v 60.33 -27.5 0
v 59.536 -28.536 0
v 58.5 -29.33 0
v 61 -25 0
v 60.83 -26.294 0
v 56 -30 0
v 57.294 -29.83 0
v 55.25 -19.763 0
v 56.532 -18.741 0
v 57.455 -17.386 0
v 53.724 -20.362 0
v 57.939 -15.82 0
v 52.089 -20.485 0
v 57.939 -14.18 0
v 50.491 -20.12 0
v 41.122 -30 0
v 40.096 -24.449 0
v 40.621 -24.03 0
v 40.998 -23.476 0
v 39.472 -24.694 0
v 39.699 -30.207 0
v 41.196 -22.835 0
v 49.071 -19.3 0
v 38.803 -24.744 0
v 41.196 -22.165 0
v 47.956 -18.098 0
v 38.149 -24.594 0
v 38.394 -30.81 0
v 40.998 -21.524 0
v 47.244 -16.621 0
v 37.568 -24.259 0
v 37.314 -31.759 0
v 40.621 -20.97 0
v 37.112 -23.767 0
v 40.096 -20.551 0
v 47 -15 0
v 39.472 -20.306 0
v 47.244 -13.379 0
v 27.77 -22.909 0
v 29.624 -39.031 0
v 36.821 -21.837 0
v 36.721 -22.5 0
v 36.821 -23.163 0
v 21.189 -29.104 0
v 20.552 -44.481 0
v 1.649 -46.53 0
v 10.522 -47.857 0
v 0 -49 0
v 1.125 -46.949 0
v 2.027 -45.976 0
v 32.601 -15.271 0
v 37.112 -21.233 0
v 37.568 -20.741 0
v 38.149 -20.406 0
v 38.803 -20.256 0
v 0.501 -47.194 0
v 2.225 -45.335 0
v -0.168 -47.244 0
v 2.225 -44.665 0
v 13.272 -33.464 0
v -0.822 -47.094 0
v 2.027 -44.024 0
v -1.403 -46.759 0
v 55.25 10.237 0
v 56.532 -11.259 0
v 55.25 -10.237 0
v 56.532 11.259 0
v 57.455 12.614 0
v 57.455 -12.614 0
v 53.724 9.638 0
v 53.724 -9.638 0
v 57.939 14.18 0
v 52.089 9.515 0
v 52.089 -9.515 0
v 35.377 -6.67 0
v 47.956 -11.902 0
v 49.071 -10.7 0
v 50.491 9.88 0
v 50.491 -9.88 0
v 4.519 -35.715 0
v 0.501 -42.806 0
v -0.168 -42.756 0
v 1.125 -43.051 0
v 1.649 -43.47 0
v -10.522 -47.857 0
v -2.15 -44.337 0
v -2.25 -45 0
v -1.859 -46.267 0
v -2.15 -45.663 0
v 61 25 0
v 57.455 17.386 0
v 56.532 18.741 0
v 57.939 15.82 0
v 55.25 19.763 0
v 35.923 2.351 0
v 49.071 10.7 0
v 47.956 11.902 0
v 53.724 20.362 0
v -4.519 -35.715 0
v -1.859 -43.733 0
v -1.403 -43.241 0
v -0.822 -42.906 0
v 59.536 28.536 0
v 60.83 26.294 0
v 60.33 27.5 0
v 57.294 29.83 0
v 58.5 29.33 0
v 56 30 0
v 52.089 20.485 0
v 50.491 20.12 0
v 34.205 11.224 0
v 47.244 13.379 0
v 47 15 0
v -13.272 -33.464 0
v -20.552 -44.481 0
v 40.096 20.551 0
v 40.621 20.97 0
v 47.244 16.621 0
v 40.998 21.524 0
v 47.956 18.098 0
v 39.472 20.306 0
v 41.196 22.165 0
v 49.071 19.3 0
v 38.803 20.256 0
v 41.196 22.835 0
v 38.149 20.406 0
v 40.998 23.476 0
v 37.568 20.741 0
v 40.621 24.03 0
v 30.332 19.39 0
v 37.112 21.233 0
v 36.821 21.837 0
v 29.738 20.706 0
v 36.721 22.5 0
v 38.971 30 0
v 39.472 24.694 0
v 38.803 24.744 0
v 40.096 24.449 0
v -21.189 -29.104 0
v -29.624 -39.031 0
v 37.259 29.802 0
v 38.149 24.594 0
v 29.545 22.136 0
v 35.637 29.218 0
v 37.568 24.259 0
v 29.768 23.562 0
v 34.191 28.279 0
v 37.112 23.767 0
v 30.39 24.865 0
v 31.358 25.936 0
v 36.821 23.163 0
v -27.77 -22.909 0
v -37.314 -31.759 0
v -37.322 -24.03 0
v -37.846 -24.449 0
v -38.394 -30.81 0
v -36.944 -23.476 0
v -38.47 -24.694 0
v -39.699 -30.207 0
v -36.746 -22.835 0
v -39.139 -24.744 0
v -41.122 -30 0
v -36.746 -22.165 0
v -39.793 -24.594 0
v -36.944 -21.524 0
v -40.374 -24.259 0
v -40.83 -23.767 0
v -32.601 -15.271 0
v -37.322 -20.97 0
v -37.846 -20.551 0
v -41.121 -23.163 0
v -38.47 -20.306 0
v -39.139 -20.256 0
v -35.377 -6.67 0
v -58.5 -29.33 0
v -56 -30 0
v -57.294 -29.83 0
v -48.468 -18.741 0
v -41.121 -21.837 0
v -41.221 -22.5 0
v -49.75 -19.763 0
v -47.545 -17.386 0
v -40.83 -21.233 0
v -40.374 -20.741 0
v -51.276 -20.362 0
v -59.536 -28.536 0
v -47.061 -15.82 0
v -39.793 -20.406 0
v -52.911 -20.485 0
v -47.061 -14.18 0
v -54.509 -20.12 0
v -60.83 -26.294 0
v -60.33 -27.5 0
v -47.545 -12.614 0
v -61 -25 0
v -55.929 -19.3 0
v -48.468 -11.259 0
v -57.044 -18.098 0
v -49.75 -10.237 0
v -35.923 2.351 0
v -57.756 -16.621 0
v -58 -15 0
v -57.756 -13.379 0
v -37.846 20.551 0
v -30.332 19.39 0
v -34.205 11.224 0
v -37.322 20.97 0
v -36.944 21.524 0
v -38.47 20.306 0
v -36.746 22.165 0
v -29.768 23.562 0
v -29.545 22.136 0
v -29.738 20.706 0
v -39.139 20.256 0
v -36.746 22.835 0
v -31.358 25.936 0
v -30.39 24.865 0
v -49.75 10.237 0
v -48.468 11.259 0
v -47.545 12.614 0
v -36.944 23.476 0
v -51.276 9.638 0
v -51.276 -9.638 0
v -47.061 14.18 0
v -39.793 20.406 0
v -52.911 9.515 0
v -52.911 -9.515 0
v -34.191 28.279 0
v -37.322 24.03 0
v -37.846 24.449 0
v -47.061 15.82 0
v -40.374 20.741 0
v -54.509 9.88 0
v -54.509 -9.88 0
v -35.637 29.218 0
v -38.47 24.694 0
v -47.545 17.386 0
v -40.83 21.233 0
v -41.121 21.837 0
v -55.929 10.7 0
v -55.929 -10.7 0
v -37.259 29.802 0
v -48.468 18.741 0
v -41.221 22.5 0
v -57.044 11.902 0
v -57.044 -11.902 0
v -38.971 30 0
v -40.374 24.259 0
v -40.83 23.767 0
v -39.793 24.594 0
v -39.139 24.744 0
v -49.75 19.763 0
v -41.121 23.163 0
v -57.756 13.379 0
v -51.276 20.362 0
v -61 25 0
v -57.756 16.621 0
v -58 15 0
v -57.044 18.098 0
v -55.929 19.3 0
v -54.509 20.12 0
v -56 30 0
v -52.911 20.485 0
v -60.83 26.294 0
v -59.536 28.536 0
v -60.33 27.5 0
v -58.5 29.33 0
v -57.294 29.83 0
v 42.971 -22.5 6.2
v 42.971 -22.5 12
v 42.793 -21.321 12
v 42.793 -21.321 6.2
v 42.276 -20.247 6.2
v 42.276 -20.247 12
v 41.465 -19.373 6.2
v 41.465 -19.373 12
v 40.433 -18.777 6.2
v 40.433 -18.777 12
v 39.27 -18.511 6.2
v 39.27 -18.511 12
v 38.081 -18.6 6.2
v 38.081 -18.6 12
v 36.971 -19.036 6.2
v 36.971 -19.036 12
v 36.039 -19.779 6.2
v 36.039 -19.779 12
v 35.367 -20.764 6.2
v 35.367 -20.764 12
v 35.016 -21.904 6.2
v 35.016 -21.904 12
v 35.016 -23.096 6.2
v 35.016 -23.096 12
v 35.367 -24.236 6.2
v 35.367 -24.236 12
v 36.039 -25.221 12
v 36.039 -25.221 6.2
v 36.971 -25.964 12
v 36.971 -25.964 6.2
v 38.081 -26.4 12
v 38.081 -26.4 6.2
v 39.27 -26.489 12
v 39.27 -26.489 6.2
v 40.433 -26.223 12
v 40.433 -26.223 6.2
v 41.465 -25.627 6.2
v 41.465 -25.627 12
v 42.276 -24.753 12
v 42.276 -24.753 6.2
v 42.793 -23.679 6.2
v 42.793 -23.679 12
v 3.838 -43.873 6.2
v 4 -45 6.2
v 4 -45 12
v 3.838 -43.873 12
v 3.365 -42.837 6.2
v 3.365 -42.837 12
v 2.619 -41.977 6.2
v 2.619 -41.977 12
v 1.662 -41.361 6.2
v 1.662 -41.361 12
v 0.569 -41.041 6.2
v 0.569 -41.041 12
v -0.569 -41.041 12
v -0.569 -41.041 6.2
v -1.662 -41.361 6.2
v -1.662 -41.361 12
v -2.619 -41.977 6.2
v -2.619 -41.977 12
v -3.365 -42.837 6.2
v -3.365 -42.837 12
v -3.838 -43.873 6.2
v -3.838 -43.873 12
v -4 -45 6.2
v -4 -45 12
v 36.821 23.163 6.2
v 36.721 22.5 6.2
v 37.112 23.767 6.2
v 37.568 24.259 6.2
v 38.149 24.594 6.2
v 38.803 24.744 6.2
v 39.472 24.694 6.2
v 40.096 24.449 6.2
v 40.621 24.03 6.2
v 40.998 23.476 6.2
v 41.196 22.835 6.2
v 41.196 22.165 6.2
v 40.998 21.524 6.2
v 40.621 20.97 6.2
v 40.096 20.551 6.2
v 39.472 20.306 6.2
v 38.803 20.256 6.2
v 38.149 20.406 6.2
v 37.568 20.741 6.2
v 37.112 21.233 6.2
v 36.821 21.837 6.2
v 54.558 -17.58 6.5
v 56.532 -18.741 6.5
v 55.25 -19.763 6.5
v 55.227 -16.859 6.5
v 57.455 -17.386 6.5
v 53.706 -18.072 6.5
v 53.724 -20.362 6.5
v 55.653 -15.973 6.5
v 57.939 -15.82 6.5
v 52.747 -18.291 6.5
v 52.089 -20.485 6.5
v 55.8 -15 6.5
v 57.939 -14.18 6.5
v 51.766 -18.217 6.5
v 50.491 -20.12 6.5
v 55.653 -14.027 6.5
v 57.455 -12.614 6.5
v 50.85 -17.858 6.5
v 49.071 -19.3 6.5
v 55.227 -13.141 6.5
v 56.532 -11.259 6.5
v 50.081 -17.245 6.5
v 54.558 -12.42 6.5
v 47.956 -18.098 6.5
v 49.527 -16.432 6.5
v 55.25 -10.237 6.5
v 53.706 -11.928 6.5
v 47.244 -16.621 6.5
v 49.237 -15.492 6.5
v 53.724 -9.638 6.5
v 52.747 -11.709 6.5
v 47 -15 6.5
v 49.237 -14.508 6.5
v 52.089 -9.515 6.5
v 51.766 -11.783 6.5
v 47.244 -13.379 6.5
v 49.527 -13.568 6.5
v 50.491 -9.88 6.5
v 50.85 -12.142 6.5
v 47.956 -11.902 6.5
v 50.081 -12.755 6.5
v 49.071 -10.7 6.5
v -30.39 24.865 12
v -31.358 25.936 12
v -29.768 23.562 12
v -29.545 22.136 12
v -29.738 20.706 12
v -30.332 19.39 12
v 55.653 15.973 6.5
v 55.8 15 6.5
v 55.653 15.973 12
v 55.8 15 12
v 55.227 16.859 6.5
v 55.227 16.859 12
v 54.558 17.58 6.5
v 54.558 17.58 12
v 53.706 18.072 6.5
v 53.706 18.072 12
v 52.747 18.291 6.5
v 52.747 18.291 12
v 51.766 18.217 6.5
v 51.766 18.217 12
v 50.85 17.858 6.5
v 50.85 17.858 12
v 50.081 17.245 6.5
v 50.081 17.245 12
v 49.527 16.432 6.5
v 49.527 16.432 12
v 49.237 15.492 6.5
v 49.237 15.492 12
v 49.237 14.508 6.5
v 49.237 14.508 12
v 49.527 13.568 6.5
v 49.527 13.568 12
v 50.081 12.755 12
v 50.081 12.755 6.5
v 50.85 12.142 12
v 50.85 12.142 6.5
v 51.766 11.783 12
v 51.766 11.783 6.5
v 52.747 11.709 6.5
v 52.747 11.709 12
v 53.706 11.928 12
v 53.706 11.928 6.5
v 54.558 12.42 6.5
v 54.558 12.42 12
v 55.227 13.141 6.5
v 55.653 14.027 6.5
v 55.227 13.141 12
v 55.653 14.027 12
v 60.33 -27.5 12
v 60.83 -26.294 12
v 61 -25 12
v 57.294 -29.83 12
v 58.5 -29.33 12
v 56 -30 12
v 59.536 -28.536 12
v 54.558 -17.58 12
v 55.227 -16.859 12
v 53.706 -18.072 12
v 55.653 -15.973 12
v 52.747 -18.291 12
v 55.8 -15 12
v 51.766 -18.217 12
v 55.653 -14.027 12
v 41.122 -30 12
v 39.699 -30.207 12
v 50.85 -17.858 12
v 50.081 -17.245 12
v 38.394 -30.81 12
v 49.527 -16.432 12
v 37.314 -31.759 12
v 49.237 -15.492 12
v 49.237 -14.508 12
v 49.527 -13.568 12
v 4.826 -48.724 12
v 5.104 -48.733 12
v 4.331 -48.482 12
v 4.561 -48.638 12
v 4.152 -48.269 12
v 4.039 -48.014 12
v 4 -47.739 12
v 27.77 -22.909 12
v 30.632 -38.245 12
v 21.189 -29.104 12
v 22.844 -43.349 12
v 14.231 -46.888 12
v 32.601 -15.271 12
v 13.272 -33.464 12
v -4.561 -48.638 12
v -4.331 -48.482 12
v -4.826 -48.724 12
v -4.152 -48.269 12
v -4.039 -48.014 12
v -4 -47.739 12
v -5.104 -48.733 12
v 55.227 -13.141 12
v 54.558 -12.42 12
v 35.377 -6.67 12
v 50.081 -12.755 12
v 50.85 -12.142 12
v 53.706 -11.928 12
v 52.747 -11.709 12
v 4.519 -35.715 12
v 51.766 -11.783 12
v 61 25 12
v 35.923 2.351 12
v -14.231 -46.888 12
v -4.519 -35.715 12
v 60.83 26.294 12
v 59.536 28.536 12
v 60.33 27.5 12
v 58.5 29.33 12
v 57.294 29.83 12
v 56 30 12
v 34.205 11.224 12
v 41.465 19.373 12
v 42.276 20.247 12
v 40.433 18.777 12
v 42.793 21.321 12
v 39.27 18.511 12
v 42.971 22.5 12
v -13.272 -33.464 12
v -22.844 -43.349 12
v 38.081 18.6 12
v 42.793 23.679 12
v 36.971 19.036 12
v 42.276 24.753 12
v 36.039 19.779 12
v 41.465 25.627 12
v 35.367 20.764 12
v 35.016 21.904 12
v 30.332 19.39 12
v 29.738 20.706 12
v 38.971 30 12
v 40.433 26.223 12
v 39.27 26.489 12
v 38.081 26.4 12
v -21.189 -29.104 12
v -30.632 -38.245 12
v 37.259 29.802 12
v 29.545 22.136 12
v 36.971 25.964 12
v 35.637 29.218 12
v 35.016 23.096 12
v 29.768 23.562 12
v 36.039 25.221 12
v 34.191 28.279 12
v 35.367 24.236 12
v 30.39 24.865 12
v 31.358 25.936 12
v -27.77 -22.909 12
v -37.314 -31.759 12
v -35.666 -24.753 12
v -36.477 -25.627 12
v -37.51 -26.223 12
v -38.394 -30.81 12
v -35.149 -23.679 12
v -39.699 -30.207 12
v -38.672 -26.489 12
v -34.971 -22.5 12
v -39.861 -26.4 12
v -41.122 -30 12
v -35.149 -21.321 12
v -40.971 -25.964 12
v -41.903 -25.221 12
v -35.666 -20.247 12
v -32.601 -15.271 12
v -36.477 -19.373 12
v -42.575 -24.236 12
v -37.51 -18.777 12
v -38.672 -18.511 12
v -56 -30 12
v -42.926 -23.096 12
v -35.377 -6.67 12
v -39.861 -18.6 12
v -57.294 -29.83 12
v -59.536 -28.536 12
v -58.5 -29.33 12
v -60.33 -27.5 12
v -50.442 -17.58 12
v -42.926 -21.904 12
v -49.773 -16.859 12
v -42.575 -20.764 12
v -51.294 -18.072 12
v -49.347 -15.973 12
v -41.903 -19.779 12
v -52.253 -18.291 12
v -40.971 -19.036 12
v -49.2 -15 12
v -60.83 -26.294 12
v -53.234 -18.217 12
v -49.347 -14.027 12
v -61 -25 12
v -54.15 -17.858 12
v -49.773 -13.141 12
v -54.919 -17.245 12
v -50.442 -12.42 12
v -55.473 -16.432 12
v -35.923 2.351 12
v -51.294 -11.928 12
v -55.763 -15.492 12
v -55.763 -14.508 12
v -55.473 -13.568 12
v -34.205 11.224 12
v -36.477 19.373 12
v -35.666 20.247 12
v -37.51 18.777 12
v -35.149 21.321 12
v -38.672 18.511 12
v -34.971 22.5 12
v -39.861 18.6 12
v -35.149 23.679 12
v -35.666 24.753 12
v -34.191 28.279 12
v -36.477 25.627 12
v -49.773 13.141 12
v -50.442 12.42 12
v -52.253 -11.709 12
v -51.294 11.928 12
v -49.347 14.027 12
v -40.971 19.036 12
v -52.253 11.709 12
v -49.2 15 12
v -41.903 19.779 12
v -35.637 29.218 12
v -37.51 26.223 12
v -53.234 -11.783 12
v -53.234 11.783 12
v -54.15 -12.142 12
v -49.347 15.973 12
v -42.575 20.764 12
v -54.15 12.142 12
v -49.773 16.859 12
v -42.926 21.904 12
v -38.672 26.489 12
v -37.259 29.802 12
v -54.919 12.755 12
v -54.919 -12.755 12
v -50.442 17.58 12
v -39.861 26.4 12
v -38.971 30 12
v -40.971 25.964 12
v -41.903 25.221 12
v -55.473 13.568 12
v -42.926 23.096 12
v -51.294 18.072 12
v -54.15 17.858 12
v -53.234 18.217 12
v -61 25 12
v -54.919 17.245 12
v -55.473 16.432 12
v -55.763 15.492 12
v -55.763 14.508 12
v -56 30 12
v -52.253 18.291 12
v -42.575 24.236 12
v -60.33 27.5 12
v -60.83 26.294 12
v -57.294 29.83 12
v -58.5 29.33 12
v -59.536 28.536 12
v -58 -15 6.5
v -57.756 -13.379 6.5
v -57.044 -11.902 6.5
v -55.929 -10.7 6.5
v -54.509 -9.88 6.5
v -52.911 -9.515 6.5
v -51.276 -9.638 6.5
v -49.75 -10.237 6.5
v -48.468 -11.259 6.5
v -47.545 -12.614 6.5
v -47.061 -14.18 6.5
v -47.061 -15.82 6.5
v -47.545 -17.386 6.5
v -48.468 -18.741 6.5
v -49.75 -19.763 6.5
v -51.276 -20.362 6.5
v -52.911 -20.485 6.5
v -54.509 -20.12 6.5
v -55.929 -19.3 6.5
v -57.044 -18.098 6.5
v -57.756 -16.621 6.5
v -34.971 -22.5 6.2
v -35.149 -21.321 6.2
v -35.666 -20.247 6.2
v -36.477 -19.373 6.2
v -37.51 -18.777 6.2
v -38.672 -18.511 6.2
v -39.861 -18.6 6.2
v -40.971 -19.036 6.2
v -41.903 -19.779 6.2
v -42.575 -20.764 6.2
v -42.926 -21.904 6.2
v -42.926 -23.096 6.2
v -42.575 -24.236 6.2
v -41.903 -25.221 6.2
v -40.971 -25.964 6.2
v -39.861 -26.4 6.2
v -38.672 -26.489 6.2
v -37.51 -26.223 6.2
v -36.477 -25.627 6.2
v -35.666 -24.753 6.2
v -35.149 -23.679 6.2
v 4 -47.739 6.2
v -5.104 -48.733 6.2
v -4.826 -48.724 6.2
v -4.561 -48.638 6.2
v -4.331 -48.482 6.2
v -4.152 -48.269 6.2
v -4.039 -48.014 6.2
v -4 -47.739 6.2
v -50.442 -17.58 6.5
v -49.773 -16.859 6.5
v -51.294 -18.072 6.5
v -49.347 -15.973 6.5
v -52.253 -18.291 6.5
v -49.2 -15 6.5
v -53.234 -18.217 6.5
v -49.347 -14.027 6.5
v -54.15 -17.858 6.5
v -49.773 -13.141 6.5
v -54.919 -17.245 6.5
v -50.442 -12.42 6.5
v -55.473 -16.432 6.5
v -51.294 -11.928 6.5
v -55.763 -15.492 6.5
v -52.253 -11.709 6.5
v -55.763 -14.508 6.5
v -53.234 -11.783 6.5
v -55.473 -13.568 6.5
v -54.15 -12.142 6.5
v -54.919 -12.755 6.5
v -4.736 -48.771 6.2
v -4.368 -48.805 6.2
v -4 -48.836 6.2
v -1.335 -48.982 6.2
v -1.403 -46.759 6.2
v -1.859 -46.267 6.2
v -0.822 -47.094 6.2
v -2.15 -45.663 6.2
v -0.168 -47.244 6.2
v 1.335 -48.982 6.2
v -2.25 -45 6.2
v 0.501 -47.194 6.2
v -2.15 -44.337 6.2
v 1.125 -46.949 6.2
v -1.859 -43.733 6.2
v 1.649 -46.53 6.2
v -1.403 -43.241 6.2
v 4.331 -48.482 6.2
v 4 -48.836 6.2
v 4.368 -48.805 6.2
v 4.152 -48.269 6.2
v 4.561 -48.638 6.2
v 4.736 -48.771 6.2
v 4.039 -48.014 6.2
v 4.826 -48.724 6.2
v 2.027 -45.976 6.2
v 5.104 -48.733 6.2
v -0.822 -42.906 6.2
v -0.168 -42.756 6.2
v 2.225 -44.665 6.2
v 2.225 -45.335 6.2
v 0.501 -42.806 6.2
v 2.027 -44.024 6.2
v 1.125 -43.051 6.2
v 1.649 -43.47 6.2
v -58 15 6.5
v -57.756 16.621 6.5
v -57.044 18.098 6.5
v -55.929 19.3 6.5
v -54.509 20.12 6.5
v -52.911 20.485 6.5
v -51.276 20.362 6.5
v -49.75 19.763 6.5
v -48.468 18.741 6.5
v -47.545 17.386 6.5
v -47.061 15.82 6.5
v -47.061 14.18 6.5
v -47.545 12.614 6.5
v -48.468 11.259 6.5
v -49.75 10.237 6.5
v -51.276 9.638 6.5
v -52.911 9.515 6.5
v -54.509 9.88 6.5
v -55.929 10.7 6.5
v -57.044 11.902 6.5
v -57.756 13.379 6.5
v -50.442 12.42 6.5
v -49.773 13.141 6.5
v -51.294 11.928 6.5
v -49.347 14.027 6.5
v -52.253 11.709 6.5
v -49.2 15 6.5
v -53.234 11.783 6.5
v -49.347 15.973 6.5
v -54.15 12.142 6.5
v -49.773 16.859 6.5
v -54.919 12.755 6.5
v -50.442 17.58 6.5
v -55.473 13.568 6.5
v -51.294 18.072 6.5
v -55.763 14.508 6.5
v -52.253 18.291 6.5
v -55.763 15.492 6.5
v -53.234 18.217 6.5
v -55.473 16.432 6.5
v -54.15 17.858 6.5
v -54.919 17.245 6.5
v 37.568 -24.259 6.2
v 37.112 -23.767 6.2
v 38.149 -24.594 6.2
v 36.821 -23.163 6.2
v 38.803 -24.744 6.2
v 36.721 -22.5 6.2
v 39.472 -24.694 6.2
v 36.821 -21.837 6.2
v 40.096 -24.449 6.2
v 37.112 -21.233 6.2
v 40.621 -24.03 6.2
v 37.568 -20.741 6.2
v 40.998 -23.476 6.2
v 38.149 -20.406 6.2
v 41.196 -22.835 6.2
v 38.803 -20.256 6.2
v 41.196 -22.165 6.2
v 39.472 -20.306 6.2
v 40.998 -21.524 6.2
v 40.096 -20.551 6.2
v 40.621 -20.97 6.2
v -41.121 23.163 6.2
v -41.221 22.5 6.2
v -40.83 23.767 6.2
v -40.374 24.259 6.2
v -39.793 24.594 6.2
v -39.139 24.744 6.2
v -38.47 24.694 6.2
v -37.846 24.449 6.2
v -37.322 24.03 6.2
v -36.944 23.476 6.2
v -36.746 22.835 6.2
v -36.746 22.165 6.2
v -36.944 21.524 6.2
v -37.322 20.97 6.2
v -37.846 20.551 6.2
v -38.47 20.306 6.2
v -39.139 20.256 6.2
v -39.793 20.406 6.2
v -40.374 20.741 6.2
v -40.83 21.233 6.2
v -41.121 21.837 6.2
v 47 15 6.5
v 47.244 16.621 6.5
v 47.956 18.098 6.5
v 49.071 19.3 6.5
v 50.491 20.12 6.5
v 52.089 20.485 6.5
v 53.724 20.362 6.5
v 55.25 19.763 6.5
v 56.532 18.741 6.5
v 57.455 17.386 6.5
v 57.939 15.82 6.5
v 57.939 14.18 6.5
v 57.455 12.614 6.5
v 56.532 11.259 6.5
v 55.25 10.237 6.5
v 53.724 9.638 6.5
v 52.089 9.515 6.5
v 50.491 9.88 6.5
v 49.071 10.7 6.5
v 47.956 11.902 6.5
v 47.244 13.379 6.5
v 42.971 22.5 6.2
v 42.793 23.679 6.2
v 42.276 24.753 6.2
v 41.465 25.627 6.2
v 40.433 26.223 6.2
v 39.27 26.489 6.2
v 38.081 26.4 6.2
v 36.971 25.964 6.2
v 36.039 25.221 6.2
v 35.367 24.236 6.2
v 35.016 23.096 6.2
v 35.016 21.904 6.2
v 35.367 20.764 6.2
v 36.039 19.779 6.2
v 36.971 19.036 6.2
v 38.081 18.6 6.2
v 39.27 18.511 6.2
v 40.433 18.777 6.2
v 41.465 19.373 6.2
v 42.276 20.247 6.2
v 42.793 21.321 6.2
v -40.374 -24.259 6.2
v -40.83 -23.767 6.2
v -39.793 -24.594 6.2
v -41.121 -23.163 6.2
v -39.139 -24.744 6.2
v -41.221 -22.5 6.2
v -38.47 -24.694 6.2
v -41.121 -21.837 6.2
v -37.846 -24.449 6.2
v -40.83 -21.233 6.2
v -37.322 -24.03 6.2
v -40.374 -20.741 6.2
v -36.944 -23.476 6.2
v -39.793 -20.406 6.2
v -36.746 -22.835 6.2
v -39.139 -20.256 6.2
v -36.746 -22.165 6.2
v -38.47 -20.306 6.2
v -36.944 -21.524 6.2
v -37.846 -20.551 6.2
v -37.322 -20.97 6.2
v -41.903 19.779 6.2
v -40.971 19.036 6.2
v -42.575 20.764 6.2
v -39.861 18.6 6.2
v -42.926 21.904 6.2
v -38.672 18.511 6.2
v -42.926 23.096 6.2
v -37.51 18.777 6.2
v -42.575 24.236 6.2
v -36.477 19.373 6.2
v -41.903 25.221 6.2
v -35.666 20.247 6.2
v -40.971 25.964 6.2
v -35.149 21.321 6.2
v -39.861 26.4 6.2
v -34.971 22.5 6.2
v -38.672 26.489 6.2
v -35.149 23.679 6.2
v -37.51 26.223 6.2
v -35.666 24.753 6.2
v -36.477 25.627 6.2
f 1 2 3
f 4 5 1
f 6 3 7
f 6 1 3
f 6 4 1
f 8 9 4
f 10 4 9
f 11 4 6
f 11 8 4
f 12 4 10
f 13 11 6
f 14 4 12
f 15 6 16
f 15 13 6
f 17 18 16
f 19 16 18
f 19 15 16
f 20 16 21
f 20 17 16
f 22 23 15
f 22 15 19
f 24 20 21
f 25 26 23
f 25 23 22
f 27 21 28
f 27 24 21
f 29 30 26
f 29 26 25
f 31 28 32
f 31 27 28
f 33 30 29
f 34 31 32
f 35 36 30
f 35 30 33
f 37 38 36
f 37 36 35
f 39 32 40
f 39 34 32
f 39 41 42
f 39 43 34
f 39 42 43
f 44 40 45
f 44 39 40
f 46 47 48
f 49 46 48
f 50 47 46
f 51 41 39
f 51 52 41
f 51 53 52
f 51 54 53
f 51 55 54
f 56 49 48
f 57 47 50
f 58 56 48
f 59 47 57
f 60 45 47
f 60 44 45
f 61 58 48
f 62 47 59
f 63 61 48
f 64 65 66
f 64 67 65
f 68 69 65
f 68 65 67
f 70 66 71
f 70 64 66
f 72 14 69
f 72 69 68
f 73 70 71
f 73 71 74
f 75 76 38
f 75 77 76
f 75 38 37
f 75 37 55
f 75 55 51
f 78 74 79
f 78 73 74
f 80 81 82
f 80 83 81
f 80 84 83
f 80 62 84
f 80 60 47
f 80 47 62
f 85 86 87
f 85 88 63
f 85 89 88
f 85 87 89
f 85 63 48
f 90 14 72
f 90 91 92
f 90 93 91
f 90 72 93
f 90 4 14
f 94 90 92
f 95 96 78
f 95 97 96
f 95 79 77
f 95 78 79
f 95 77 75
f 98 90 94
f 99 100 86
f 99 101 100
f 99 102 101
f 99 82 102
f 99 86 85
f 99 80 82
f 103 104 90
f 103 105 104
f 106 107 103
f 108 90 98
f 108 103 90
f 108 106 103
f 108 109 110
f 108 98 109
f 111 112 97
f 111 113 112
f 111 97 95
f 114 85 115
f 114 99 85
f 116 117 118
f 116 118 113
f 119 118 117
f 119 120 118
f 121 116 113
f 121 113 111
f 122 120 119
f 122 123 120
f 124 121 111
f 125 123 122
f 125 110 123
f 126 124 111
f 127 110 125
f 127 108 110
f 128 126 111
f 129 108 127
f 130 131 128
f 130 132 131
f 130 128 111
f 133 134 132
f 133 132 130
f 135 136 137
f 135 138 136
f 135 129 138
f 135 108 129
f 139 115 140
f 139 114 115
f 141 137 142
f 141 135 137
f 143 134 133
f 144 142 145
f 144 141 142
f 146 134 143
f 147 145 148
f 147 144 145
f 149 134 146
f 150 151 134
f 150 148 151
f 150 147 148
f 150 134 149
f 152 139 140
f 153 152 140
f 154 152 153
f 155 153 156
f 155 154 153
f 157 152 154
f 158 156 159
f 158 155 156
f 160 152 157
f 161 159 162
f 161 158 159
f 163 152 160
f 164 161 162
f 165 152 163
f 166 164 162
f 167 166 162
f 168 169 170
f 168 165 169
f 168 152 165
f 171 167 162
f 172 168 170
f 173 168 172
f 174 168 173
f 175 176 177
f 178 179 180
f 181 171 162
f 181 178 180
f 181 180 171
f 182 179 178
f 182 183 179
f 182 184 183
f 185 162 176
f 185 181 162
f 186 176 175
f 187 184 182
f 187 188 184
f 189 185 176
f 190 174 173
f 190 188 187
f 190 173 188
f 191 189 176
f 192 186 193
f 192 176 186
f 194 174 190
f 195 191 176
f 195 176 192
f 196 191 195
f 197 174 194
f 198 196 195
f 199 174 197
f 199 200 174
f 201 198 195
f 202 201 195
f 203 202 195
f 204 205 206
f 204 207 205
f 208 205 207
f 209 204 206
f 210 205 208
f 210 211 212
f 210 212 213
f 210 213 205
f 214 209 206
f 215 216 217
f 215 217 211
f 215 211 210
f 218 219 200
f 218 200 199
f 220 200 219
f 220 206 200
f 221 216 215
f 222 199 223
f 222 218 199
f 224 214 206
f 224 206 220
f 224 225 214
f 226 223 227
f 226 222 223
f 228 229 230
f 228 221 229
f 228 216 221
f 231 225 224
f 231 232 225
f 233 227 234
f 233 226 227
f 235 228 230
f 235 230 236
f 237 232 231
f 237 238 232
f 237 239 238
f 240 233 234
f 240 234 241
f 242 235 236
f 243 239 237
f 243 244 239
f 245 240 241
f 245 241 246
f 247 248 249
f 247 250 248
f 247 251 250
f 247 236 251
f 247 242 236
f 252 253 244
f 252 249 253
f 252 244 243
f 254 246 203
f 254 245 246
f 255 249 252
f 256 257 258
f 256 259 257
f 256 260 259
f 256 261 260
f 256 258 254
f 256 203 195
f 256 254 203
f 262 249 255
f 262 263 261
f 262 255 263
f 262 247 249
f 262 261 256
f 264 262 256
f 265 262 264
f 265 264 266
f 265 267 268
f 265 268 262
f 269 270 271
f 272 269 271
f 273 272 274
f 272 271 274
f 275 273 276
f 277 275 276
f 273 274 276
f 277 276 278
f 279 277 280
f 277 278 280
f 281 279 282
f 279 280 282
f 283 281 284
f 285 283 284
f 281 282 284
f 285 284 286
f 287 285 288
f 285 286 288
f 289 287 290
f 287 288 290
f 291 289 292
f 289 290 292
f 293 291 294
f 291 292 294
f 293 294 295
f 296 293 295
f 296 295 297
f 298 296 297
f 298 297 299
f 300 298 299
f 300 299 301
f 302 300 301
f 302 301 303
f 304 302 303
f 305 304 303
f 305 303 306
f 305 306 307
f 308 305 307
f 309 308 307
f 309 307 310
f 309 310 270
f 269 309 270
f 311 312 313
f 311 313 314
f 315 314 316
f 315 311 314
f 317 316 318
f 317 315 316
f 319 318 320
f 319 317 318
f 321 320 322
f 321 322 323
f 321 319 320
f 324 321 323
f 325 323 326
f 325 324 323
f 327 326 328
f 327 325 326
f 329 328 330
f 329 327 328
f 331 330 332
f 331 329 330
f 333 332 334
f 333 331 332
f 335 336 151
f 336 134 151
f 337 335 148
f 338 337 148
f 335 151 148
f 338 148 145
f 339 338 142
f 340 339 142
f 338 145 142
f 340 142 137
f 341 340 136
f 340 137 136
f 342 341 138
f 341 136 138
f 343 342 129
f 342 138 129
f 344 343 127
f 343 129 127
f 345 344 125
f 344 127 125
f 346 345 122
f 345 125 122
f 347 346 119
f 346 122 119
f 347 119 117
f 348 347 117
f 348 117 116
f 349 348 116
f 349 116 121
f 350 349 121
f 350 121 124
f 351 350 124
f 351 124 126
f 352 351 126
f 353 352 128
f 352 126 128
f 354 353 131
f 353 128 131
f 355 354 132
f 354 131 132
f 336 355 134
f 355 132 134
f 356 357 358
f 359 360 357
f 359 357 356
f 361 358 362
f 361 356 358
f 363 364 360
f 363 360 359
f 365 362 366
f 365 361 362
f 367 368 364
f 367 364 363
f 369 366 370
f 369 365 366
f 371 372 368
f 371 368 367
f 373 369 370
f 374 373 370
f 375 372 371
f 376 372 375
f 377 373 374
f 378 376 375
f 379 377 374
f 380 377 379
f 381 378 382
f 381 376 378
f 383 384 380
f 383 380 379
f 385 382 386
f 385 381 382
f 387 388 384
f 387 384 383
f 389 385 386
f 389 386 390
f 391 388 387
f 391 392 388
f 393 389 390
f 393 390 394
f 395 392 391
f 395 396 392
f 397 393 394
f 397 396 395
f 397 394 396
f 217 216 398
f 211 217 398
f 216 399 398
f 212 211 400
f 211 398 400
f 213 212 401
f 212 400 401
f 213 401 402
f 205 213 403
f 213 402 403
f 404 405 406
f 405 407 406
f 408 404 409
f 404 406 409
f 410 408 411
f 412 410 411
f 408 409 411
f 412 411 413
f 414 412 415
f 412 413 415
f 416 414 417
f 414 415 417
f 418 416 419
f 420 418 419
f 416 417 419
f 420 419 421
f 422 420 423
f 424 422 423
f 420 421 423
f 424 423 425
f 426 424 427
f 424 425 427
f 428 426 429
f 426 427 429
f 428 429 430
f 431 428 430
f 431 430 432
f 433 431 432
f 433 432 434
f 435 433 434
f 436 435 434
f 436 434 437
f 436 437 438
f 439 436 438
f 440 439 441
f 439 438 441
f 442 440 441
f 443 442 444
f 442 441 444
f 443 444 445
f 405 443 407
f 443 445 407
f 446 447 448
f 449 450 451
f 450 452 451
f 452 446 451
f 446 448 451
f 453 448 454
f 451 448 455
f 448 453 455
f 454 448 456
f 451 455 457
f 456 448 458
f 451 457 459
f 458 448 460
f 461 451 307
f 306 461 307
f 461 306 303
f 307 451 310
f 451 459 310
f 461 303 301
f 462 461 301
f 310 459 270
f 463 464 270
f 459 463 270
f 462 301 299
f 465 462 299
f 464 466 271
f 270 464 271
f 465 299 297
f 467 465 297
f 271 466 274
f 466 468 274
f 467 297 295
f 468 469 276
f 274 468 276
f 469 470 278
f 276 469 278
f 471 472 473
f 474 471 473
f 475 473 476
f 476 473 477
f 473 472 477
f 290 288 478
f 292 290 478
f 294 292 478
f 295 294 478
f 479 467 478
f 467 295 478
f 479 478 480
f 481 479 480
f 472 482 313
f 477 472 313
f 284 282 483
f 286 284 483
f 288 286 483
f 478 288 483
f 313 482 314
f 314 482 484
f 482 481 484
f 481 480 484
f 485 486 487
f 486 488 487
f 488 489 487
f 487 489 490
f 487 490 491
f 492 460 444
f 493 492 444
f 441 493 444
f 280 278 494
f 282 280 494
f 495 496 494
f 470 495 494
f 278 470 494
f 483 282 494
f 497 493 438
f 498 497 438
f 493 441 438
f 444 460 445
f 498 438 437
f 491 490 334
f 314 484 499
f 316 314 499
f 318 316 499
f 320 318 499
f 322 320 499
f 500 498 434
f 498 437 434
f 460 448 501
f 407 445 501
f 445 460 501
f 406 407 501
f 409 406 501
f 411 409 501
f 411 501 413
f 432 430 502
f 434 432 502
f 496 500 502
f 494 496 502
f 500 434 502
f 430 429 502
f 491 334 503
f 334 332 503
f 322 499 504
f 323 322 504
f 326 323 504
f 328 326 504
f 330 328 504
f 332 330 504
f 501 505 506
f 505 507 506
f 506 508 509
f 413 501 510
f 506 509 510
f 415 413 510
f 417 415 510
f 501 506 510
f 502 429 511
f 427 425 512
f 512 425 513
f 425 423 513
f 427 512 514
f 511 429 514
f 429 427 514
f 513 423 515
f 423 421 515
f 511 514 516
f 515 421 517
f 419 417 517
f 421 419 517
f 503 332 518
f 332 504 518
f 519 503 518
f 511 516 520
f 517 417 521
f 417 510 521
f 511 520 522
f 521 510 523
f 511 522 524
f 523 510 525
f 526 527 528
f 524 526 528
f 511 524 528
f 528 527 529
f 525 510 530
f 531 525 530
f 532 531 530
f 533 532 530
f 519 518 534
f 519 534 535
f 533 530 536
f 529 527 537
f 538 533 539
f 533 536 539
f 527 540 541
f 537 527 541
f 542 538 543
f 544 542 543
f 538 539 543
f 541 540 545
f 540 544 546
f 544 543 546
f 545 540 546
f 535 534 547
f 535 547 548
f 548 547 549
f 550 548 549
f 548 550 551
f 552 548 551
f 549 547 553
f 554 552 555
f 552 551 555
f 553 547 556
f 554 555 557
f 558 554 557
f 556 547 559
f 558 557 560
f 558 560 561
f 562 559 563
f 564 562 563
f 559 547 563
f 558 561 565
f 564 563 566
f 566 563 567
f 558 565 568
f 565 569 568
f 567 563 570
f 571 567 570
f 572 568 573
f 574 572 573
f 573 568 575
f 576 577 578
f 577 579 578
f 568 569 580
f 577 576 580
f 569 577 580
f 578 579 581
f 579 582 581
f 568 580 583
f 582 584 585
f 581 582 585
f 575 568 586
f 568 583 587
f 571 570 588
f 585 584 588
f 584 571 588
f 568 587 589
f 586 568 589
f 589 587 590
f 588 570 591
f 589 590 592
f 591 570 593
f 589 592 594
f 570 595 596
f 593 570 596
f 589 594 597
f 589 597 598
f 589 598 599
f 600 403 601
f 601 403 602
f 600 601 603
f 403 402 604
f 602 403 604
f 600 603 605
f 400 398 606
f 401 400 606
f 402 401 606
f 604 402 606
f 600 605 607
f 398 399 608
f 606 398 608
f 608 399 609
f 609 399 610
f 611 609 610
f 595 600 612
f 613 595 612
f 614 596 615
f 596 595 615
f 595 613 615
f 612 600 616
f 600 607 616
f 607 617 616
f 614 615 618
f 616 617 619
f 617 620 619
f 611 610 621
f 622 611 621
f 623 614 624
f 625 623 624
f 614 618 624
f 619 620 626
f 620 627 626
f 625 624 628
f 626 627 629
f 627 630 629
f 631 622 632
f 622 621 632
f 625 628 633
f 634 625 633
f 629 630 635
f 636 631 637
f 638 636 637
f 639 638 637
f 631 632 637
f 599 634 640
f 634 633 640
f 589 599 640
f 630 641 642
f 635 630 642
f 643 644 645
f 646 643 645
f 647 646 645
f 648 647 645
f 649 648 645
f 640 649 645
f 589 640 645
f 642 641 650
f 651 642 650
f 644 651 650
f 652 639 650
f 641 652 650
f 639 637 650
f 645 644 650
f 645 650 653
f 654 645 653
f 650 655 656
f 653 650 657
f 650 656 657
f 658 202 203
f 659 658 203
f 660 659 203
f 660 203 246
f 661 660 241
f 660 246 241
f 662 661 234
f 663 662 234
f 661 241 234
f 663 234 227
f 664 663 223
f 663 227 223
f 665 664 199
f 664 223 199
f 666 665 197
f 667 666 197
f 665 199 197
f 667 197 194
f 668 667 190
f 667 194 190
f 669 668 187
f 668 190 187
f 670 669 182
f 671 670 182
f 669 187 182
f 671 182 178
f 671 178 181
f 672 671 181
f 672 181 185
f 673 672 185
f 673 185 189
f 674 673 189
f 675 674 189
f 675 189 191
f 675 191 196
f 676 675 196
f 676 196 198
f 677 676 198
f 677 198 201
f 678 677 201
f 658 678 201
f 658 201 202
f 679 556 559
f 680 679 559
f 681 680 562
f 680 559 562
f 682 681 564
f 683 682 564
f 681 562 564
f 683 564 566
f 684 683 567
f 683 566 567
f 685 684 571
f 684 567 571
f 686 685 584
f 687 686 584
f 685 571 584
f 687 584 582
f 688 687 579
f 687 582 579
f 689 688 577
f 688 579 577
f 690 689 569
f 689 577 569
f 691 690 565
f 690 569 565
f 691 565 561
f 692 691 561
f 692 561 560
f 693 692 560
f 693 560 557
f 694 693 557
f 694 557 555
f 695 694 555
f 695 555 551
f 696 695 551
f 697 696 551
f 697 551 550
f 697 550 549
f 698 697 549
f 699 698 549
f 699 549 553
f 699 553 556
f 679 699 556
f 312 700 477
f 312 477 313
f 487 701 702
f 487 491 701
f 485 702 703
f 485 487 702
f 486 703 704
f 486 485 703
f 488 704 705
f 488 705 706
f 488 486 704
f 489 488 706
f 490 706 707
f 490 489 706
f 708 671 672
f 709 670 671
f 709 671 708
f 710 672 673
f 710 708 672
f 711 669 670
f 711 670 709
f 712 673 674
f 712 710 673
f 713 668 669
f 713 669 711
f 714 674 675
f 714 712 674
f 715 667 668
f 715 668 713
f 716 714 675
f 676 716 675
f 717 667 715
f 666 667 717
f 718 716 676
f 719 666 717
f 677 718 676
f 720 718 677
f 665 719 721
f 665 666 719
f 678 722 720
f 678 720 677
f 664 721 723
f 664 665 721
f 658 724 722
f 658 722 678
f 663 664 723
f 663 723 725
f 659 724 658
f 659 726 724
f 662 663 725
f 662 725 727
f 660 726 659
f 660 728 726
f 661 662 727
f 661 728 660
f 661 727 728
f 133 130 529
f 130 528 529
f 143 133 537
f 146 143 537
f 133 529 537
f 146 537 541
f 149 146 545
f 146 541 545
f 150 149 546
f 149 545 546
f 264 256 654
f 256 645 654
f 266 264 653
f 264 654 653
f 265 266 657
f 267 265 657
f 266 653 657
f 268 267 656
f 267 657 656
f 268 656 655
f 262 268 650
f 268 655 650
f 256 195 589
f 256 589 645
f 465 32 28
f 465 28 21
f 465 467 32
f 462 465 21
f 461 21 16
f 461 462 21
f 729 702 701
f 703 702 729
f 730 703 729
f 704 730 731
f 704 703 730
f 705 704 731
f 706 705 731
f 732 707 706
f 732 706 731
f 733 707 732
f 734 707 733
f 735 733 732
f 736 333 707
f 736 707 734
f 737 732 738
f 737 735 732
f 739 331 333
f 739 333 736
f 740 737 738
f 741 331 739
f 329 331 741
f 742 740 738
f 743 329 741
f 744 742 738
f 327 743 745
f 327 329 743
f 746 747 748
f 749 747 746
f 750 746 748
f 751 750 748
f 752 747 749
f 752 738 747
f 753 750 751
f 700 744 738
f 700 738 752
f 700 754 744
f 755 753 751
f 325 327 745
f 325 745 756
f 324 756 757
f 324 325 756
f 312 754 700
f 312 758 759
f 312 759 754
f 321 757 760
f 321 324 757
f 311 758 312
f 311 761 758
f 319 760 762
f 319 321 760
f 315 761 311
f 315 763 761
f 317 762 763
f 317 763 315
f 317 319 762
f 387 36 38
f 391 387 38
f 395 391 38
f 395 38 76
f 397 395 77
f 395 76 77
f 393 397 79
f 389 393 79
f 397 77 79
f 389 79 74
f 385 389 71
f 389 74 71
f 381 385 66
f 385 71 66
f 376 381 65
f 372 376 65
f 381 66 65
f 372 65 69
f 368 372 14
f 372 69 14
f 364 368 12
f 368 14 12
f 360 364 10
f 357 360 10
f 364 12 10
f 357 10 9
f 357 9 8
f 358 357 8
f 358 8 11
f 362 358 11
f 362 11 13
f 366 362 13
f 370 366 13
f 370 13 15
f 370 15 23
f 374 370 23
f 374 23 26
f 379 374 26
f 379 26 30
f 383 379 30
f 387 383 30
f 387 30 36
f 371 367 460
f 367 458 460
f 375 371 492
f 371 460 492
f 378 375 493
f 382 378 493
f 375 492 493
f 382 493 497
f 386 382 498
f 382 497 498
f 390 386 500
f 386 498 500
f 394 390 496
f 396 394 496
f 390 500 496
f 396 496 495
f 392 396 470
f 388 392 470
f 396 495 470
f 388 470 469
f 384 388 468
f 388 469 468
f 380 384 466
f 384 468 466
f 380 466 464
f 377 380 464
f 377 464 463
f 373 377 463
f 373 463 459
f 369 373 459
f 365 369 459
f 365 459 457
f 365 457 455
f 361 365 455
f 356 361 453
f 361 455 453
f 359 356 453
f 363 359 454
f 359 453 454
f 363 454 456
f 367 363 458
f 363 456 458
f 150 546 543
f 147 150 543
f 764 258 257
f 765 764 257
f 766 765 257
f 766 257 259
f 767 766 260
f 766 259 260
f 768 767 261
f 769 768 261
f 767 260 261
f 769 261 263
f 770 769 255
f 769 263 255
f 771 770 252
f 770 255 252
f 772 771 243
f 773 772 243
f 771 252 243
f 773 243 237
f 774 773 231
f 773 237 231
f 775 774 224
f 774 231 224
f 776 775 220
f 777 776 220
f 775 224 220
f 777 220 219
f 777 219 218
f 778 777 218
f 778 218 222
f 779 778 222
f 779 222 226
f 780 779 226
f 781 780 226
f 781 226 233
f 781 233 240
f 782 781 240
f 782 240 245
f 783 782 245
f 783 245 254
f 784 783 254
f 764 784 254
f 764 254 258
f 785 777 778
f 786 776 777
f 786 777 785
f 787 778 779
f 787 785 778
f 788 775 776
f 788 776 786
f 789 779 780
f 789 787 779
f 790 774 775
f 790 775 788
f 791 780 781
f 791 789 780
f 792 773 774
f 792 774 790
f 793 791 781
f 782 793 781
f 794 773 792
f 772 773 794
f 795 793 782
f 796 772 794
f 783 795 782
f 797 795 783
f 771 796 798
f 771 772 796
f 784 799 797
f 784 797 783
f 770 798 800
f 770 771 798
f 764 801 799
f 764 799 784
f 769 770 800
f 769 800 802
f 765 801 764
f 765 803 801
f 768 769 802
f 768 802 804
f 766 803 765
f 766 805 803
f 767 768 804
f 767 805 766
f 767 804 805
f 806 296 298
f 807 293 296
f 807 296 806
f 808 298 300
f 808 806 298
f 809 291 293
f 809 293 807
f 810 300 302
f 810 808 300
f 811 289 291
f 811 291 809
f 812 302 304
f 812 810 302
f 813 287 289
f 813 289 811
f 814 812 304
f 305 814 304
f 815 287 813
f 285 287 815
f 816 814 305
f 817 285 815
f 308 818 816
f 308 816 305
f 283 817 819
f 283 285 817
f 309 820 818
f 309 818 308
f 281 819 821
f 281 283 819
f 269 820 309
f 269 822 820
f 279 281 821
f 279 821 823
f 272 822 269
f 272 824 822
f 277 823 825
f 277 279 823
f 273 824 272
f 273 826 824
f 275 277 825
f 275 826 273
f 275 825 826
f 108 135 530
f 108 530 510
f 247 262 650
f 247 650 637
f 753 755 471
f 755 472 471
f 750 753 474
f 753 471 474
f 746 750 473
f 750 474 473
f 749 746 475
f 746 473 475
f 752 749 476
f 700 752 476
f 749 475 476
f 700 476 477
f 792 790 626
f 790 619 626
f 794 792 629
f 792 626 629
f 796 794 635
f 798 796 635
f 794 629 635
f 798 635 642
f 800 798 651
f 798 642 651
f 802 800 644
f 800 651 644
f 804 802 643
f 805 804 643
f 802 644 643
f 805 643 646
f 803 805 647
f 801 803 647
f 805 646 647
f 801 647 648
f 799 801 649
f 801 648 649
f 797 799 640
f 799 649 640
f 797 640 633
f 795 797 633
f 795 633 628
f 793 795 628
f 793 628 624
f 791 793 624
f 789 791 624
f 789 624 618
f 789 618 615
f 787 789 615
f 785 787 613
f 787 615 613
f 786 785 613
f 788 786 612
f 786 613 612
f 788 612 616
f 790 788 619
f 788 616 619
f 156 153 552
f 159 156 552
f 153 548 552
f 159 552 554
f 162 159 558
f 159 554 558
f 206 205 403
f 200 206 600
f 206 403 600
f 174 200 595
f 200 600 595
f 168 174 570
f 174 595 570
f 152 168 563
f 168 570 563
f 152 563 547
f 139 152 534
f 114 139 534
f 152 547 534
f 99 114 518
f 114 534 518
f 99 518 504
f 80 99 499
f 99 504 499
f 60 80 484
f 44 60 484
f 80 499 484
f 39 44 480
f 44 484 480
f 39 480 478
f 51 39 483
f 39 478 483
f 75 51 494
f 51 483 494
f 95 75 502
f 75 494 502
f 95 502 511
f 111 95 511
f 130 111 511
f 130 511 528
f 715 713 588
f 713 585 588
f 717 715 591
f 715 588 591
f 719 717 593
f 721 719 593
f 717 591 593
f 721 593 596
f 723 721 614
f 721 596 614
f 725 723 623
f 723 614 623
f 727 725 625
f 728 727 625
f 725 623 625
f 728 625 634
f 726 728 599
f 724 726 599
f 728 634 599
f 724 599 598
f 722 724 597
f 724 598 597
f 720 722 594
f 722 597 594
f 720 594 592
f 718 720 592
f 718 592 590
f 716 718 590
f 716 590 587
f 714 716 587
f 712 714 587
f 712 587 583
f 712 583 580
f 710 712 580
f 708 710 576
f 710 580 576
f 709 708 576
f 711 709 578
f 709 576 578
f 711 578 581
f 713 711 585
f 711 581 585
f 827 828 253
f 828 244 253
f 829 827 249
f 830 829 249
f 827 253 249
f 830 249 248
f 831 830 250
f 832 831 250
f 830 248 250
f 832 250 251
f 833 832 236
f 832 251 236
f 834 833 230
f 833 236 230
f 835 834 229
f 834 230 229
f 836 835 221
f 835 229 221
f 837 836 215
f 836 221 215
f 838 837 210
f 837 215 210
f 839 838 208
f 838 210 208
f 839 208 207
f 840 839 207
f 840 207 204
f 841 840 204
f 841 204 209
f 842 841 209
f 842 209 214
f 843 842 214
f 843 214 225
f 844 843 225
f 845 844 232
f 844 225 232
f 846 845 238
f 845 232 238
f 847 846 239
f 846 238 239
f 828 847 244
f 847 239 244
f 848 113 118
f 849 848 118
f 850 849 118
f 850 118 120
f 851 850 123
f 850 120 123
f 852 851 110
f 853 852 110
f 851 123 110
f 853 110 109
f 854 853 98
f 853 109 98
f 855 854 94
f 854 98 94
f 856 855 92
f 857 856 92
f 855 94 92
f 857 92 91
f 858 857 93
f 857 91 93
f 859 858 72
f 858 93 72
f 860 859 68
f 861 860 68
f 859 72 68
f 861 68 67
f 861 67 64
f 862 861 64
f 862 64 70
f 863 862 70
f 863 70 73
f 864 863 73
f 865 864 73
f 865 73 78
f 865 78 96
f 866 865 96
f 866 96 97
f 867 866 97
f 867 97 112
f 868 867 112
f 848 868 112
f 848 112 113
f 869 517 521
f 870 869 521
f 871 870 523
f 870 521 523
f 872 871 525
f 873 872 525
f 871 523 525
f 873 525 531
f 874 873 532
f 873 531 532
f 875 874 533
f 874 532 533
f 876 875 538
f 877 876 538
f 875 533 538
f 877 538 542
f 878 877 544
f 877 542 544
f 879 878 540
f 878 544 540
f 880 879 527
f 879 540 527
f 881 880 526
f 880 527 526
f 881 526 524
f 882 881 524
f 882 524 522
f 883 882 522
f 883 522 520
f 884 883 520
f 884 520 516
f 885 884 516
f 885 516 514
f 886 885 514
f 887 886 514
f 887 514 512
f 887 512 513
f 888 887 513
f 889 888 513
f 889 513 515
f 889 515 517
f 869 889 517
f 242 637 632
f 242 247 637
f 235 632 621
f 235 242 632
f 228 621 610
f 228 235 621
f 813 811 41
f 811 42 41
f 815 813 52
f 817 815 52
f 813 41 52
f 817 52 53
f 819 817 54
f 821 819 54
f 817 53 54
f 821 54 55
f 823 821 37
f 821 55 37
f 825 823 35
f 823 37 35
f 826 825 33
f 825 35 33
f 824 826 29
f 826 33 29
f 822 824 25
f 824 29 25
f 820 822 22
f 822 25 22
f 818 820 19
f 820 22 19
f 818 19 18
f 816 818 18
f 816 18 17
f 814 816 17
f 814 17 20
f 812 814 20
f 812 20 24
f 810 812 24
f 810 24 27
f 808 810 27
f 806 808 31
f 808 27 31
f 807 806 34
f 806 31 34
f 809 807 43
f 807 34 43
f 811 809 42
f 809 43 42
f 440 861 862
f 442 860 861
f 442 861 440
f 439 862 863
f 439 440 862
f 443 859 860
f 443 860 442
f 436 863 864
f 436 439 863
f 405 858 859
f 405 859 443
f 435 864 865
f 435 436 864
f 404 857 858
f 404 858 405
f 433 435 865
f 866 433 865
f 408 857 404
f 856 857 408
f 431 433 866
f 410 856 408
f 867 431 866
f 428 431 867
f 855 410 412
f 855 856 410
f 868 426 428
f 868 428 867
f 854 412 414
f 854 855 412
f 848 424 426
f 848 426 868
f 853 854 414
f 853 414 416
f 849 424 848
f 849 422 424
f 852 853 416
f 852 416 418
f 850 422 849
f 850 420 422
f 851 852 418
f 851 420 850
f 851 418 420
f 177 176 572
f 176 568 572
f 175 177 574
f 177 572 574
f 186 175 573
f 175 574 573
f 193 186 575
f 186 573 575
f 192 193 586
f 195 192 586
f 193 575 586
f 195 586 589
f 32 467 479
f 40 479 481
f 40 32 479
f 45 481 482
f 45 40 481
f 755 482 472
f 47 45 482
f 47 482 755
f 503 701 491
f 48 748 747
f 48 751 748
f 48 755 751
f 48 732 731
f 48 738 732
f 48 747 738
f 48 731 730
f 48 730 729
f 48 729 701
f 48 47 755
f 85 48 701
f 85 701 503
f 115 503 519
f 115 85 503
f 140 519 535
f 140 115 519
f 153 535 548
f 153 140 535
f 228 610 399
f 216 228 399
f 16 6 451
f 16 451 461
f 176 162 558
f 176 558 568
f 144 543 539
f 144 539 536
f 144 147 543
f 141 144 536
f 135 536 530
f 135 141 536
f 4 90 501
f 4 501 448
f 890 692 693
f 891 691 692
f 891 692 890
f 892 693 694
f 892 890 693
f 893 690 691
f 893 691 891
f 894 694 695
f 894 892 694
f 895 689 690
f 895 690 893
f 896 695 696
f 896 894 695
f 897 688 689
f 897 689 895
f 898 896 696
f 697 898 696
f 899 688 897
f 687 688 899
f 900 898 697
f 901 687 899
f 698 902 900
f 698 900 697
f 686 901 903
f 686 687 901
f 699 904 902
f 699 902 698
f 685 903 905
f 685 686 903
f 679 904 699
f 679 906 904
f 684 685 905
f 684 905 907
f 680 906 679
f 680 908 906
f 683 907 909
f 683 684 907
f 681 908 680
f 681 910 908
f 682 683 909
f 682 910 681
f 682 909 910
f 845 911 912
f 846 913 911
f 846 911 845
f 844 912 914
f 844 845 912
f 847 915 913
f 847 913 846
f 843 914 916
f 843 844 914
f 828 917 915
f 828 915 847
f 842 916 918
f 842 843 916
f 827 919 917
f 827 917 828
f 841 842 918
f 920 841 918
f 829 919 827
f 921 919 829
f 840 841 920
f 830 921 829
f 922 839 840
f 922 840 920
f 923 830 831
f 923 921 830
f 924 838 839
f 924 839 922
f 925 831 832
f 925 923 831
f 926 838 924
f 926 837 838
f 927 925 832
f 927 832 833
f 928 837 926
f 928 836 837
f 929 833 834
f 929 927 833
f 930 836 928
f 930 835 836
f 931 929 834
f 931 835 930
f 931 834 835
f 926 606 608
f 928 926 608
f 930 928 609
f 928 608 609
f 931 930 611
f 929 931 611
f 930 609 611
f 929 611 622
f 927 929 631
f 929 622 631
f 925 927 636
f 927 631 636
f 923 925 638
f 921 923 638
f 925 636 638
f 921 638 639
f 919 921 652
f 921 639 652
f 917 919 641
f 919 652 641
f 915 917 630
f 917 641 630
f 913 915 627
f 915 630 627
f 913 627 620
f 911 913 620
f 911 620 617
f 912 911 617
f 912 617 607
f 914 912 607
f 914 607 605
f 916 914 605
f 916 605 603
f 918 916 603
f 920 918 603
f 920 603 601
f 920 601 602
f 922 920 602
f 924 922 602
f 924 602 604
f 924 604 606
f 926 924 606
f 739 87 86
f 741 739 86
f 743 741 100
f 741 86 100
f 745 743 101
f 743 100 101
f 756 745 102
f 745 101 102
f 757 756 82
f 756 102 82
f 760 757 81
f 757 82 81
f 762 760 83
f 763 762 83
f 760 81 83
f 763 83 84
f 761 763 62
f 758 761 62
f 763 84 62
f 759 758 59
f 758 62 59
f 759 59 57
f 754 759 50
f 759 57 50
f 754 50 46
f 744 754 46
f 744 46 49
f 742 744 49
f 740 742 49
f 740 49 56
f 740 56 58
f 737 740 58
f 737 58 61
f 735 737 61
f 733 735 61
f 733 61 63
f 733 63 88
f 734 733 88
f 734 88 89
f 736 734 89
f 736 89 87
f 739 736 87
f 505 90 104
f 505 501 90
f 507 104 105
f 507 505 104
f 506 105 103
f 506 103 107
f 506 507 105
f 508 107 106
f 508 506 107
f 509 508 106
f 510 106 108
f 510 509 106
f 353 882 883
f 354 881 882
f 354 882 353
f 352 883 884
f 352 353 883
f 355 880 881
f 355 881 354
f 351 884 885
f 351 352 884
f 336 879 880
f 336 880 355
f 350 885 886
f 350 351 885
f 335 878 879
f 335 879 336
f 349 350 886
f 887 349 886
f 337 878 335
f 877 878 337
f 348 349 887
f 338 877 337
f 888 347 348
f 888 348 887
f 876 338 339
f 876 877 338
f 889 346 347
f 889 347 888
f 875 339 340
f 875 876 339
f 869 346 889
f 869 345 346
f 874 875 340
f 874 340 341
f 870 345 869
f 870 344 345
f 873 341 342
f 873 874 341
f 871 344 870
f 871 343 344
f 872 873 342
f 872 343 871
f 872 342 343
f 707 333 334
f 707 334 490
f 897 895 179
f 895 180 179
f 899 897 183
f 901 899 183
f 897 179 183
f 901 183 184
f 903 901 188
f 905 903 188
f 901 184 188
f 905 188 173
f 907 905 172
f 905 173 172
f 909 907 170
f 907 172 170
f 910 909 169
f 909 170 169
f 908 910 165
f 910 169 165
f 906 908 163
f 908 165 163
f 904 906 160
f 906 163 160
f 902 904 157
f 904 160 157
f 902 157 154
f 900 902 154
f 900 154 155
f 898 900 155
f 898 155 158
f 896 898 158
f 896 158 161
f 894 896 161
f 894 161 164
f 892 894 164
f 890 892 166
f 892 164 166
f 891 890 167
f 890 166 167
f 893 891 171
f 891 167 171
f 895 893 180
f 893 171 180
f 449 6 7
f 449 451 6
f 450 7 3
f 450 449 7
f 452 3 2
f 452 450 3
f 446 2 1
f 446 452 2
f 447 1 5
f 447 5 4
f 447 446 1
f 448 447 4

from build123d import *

# Parameters (mm, degrees)
EXTRUDE_1_DEPTH              = 12
CUT_EXTRUDE_1_DEPTH          = 80.158069709
CUT_EXTRUDE_START            = -5.8
CUT_EXTRUDE_2_DEPTH          = 5.8
HOLE_WIZARD_4_5_4_5_1_D      = 4.5
HOLE_WIZARD_M64_1_D          = 72
HOLE_WIZARD_M6_1_D           = 6.6
HOLE_WIZARD_M6_1_CBORE_D     = 11
HOLE_WIZARD_M6_1_CBORE_DEPTH = 6.5
HOLE_WIZARD_M4_1_D           = 4.5
HOLE_WIZARD_M4_1_CBORE_D     = 8
HOLE_WIZARD_M4_1_CBORE_DEPTH = 5.8
FILLET_1_R                   = 1
FILLET_2_R                   = 5
FILLET_3_R                   = 7.5


with BuildPart() as part:
    # 草图1 → 凸台-拉伸1 (new body)
    with BuildSketch(Plane(origin=(0, 0, 0), x_dir=(-1, 0, 0), z_dir=(0, 0, -1))):
        with BuildLine():
            Line((61, -30), (61, 30))
            Line((61, 30), (-61, 30))
            Line((-61, 30), (-61, -30))
            Line((-61, -30), (-38.742741256, -30))
            ThreePointArc((-38.742741256, -30), (0, -49), (38.742741256, -30))
            Line((38.742741256, -30), (61, -30))
        make_face()
    extrude(amount=-EXTRUDE_1_DEPTH)

    # 草图2 → 切除-拉伸1 (cut, through all)
    with BuildSketch(Plane.XY.offset(12)):
        Polygon((-36.271415569, 30), (0, 0), (36.271415569, 30), align=None)
    extrude(amount=-CUT_EXTRUDE_1_DEPTH, mode=Mode.SUBTRACT)

    # 草图3 → 切除-拉伸2 (cut)
    with BuildSketch(Plane.XY.offset(12).offset(CUT_EXTRUDE_START)):
        with BuildLine():
            Line((4, -48.836461788), (4, -45))
            ThreePointArc((4, -45), (0, -41), (-4, -45))
            Line((-4, -45), (-4, -48.836461788))
            ThreePointArc((-4, -48.836461788), (0, -49), (4, -48.836461788))
        make_face()
    extrude(amount=CUT_EXTRUDE_2_DEPTH, mode=Mode.SUBTRACT)

    # Ø4.5 (4.5) 直径孔1 (through all)
    with Locations(Plane.XY.offset(6.2)):
        with Locations((0, -45)):
            Hole(HOLE_WIZARD_4_5_4_5_1_D / 2)

    # M64 间隙孔1 (through all)
    with Locations(Plane(origin=(0, 0, 0), x_dir=(-1, 0, 0), z_dir=(0, 0, -1))):
        with Locations((0, 0)):
            Hole(HOLE_WIZARD_M64_1_D / 2)

    # M6 六角头螺栓的柱形沉头孔1 (through all)
    with Locations(Plane(origin=(0, 0, 0), x_dir=(-1, 0, 0), z_dir=(0, 0, -1))):
        with Locations((-52.5, -15), (52.5, 15), (52.5, -15), (-52.5, 15)):
            CounterBoreHole(HOLE_WIZARD_M6_1_D / 2, HOLE_WIZARD_M6_1_CBORE_D / 2, HOLE_WIZARD_M6_1_CBORE_DEPTH)

    # M4 六角头机械螺钉的柱形沉头孔1 (through all)
    with Locations(Plane.XY.offset(12)):
        with Locations((38.97114317, 22.5), (38.97114317, -22.5), (-38.97114317, -22.5), (-38.97114317, 22.5)):
            CounterBoreHole(HOLE_WIZARD_M4_1_D / 2, HOLE_WIZARD_M4_1_CBORE_D / 2, HOLE_WIZARD_M4_1_CBORE_DEPTH)

    # 圆角1
    fillet_1_edges = [part.edges().sort_by_distance(p)[0] for p in [
        (4, -48.836461788, 9.1),
        (-4, -48.836461788, 9.1),
    ]]
    fillet(fillet_1_edges, radius=FILLET_1_R)

    # 圆角2
    fillet_2_edges = [part.edges().sort_by_distance(p)[0] for p in [
        (-38.742741256, -30, 6),
        (38.742741256, -30, 6),
        (61, -30, 6),
        (61, 30, 6),
        (-61, 30, 6),
        (-61, -30, 6),
        (-27.740852298, 22.944391772, 6),
        (27.740852298, 22.944391772, 6),
    ]]
    fillet(fillet_2_edges, radius=FILLET_2_R)

    # 圆角3
    fillet_3_edges = [part.edges().sort_by_distance(p)[0] for p in [
        (-36.271415569, 30, 6),
        (36.271415569, 30, 6),
    ]]
    fillet(fillet_3_edges, radius=FILLET_3_R)


solid = part.part
